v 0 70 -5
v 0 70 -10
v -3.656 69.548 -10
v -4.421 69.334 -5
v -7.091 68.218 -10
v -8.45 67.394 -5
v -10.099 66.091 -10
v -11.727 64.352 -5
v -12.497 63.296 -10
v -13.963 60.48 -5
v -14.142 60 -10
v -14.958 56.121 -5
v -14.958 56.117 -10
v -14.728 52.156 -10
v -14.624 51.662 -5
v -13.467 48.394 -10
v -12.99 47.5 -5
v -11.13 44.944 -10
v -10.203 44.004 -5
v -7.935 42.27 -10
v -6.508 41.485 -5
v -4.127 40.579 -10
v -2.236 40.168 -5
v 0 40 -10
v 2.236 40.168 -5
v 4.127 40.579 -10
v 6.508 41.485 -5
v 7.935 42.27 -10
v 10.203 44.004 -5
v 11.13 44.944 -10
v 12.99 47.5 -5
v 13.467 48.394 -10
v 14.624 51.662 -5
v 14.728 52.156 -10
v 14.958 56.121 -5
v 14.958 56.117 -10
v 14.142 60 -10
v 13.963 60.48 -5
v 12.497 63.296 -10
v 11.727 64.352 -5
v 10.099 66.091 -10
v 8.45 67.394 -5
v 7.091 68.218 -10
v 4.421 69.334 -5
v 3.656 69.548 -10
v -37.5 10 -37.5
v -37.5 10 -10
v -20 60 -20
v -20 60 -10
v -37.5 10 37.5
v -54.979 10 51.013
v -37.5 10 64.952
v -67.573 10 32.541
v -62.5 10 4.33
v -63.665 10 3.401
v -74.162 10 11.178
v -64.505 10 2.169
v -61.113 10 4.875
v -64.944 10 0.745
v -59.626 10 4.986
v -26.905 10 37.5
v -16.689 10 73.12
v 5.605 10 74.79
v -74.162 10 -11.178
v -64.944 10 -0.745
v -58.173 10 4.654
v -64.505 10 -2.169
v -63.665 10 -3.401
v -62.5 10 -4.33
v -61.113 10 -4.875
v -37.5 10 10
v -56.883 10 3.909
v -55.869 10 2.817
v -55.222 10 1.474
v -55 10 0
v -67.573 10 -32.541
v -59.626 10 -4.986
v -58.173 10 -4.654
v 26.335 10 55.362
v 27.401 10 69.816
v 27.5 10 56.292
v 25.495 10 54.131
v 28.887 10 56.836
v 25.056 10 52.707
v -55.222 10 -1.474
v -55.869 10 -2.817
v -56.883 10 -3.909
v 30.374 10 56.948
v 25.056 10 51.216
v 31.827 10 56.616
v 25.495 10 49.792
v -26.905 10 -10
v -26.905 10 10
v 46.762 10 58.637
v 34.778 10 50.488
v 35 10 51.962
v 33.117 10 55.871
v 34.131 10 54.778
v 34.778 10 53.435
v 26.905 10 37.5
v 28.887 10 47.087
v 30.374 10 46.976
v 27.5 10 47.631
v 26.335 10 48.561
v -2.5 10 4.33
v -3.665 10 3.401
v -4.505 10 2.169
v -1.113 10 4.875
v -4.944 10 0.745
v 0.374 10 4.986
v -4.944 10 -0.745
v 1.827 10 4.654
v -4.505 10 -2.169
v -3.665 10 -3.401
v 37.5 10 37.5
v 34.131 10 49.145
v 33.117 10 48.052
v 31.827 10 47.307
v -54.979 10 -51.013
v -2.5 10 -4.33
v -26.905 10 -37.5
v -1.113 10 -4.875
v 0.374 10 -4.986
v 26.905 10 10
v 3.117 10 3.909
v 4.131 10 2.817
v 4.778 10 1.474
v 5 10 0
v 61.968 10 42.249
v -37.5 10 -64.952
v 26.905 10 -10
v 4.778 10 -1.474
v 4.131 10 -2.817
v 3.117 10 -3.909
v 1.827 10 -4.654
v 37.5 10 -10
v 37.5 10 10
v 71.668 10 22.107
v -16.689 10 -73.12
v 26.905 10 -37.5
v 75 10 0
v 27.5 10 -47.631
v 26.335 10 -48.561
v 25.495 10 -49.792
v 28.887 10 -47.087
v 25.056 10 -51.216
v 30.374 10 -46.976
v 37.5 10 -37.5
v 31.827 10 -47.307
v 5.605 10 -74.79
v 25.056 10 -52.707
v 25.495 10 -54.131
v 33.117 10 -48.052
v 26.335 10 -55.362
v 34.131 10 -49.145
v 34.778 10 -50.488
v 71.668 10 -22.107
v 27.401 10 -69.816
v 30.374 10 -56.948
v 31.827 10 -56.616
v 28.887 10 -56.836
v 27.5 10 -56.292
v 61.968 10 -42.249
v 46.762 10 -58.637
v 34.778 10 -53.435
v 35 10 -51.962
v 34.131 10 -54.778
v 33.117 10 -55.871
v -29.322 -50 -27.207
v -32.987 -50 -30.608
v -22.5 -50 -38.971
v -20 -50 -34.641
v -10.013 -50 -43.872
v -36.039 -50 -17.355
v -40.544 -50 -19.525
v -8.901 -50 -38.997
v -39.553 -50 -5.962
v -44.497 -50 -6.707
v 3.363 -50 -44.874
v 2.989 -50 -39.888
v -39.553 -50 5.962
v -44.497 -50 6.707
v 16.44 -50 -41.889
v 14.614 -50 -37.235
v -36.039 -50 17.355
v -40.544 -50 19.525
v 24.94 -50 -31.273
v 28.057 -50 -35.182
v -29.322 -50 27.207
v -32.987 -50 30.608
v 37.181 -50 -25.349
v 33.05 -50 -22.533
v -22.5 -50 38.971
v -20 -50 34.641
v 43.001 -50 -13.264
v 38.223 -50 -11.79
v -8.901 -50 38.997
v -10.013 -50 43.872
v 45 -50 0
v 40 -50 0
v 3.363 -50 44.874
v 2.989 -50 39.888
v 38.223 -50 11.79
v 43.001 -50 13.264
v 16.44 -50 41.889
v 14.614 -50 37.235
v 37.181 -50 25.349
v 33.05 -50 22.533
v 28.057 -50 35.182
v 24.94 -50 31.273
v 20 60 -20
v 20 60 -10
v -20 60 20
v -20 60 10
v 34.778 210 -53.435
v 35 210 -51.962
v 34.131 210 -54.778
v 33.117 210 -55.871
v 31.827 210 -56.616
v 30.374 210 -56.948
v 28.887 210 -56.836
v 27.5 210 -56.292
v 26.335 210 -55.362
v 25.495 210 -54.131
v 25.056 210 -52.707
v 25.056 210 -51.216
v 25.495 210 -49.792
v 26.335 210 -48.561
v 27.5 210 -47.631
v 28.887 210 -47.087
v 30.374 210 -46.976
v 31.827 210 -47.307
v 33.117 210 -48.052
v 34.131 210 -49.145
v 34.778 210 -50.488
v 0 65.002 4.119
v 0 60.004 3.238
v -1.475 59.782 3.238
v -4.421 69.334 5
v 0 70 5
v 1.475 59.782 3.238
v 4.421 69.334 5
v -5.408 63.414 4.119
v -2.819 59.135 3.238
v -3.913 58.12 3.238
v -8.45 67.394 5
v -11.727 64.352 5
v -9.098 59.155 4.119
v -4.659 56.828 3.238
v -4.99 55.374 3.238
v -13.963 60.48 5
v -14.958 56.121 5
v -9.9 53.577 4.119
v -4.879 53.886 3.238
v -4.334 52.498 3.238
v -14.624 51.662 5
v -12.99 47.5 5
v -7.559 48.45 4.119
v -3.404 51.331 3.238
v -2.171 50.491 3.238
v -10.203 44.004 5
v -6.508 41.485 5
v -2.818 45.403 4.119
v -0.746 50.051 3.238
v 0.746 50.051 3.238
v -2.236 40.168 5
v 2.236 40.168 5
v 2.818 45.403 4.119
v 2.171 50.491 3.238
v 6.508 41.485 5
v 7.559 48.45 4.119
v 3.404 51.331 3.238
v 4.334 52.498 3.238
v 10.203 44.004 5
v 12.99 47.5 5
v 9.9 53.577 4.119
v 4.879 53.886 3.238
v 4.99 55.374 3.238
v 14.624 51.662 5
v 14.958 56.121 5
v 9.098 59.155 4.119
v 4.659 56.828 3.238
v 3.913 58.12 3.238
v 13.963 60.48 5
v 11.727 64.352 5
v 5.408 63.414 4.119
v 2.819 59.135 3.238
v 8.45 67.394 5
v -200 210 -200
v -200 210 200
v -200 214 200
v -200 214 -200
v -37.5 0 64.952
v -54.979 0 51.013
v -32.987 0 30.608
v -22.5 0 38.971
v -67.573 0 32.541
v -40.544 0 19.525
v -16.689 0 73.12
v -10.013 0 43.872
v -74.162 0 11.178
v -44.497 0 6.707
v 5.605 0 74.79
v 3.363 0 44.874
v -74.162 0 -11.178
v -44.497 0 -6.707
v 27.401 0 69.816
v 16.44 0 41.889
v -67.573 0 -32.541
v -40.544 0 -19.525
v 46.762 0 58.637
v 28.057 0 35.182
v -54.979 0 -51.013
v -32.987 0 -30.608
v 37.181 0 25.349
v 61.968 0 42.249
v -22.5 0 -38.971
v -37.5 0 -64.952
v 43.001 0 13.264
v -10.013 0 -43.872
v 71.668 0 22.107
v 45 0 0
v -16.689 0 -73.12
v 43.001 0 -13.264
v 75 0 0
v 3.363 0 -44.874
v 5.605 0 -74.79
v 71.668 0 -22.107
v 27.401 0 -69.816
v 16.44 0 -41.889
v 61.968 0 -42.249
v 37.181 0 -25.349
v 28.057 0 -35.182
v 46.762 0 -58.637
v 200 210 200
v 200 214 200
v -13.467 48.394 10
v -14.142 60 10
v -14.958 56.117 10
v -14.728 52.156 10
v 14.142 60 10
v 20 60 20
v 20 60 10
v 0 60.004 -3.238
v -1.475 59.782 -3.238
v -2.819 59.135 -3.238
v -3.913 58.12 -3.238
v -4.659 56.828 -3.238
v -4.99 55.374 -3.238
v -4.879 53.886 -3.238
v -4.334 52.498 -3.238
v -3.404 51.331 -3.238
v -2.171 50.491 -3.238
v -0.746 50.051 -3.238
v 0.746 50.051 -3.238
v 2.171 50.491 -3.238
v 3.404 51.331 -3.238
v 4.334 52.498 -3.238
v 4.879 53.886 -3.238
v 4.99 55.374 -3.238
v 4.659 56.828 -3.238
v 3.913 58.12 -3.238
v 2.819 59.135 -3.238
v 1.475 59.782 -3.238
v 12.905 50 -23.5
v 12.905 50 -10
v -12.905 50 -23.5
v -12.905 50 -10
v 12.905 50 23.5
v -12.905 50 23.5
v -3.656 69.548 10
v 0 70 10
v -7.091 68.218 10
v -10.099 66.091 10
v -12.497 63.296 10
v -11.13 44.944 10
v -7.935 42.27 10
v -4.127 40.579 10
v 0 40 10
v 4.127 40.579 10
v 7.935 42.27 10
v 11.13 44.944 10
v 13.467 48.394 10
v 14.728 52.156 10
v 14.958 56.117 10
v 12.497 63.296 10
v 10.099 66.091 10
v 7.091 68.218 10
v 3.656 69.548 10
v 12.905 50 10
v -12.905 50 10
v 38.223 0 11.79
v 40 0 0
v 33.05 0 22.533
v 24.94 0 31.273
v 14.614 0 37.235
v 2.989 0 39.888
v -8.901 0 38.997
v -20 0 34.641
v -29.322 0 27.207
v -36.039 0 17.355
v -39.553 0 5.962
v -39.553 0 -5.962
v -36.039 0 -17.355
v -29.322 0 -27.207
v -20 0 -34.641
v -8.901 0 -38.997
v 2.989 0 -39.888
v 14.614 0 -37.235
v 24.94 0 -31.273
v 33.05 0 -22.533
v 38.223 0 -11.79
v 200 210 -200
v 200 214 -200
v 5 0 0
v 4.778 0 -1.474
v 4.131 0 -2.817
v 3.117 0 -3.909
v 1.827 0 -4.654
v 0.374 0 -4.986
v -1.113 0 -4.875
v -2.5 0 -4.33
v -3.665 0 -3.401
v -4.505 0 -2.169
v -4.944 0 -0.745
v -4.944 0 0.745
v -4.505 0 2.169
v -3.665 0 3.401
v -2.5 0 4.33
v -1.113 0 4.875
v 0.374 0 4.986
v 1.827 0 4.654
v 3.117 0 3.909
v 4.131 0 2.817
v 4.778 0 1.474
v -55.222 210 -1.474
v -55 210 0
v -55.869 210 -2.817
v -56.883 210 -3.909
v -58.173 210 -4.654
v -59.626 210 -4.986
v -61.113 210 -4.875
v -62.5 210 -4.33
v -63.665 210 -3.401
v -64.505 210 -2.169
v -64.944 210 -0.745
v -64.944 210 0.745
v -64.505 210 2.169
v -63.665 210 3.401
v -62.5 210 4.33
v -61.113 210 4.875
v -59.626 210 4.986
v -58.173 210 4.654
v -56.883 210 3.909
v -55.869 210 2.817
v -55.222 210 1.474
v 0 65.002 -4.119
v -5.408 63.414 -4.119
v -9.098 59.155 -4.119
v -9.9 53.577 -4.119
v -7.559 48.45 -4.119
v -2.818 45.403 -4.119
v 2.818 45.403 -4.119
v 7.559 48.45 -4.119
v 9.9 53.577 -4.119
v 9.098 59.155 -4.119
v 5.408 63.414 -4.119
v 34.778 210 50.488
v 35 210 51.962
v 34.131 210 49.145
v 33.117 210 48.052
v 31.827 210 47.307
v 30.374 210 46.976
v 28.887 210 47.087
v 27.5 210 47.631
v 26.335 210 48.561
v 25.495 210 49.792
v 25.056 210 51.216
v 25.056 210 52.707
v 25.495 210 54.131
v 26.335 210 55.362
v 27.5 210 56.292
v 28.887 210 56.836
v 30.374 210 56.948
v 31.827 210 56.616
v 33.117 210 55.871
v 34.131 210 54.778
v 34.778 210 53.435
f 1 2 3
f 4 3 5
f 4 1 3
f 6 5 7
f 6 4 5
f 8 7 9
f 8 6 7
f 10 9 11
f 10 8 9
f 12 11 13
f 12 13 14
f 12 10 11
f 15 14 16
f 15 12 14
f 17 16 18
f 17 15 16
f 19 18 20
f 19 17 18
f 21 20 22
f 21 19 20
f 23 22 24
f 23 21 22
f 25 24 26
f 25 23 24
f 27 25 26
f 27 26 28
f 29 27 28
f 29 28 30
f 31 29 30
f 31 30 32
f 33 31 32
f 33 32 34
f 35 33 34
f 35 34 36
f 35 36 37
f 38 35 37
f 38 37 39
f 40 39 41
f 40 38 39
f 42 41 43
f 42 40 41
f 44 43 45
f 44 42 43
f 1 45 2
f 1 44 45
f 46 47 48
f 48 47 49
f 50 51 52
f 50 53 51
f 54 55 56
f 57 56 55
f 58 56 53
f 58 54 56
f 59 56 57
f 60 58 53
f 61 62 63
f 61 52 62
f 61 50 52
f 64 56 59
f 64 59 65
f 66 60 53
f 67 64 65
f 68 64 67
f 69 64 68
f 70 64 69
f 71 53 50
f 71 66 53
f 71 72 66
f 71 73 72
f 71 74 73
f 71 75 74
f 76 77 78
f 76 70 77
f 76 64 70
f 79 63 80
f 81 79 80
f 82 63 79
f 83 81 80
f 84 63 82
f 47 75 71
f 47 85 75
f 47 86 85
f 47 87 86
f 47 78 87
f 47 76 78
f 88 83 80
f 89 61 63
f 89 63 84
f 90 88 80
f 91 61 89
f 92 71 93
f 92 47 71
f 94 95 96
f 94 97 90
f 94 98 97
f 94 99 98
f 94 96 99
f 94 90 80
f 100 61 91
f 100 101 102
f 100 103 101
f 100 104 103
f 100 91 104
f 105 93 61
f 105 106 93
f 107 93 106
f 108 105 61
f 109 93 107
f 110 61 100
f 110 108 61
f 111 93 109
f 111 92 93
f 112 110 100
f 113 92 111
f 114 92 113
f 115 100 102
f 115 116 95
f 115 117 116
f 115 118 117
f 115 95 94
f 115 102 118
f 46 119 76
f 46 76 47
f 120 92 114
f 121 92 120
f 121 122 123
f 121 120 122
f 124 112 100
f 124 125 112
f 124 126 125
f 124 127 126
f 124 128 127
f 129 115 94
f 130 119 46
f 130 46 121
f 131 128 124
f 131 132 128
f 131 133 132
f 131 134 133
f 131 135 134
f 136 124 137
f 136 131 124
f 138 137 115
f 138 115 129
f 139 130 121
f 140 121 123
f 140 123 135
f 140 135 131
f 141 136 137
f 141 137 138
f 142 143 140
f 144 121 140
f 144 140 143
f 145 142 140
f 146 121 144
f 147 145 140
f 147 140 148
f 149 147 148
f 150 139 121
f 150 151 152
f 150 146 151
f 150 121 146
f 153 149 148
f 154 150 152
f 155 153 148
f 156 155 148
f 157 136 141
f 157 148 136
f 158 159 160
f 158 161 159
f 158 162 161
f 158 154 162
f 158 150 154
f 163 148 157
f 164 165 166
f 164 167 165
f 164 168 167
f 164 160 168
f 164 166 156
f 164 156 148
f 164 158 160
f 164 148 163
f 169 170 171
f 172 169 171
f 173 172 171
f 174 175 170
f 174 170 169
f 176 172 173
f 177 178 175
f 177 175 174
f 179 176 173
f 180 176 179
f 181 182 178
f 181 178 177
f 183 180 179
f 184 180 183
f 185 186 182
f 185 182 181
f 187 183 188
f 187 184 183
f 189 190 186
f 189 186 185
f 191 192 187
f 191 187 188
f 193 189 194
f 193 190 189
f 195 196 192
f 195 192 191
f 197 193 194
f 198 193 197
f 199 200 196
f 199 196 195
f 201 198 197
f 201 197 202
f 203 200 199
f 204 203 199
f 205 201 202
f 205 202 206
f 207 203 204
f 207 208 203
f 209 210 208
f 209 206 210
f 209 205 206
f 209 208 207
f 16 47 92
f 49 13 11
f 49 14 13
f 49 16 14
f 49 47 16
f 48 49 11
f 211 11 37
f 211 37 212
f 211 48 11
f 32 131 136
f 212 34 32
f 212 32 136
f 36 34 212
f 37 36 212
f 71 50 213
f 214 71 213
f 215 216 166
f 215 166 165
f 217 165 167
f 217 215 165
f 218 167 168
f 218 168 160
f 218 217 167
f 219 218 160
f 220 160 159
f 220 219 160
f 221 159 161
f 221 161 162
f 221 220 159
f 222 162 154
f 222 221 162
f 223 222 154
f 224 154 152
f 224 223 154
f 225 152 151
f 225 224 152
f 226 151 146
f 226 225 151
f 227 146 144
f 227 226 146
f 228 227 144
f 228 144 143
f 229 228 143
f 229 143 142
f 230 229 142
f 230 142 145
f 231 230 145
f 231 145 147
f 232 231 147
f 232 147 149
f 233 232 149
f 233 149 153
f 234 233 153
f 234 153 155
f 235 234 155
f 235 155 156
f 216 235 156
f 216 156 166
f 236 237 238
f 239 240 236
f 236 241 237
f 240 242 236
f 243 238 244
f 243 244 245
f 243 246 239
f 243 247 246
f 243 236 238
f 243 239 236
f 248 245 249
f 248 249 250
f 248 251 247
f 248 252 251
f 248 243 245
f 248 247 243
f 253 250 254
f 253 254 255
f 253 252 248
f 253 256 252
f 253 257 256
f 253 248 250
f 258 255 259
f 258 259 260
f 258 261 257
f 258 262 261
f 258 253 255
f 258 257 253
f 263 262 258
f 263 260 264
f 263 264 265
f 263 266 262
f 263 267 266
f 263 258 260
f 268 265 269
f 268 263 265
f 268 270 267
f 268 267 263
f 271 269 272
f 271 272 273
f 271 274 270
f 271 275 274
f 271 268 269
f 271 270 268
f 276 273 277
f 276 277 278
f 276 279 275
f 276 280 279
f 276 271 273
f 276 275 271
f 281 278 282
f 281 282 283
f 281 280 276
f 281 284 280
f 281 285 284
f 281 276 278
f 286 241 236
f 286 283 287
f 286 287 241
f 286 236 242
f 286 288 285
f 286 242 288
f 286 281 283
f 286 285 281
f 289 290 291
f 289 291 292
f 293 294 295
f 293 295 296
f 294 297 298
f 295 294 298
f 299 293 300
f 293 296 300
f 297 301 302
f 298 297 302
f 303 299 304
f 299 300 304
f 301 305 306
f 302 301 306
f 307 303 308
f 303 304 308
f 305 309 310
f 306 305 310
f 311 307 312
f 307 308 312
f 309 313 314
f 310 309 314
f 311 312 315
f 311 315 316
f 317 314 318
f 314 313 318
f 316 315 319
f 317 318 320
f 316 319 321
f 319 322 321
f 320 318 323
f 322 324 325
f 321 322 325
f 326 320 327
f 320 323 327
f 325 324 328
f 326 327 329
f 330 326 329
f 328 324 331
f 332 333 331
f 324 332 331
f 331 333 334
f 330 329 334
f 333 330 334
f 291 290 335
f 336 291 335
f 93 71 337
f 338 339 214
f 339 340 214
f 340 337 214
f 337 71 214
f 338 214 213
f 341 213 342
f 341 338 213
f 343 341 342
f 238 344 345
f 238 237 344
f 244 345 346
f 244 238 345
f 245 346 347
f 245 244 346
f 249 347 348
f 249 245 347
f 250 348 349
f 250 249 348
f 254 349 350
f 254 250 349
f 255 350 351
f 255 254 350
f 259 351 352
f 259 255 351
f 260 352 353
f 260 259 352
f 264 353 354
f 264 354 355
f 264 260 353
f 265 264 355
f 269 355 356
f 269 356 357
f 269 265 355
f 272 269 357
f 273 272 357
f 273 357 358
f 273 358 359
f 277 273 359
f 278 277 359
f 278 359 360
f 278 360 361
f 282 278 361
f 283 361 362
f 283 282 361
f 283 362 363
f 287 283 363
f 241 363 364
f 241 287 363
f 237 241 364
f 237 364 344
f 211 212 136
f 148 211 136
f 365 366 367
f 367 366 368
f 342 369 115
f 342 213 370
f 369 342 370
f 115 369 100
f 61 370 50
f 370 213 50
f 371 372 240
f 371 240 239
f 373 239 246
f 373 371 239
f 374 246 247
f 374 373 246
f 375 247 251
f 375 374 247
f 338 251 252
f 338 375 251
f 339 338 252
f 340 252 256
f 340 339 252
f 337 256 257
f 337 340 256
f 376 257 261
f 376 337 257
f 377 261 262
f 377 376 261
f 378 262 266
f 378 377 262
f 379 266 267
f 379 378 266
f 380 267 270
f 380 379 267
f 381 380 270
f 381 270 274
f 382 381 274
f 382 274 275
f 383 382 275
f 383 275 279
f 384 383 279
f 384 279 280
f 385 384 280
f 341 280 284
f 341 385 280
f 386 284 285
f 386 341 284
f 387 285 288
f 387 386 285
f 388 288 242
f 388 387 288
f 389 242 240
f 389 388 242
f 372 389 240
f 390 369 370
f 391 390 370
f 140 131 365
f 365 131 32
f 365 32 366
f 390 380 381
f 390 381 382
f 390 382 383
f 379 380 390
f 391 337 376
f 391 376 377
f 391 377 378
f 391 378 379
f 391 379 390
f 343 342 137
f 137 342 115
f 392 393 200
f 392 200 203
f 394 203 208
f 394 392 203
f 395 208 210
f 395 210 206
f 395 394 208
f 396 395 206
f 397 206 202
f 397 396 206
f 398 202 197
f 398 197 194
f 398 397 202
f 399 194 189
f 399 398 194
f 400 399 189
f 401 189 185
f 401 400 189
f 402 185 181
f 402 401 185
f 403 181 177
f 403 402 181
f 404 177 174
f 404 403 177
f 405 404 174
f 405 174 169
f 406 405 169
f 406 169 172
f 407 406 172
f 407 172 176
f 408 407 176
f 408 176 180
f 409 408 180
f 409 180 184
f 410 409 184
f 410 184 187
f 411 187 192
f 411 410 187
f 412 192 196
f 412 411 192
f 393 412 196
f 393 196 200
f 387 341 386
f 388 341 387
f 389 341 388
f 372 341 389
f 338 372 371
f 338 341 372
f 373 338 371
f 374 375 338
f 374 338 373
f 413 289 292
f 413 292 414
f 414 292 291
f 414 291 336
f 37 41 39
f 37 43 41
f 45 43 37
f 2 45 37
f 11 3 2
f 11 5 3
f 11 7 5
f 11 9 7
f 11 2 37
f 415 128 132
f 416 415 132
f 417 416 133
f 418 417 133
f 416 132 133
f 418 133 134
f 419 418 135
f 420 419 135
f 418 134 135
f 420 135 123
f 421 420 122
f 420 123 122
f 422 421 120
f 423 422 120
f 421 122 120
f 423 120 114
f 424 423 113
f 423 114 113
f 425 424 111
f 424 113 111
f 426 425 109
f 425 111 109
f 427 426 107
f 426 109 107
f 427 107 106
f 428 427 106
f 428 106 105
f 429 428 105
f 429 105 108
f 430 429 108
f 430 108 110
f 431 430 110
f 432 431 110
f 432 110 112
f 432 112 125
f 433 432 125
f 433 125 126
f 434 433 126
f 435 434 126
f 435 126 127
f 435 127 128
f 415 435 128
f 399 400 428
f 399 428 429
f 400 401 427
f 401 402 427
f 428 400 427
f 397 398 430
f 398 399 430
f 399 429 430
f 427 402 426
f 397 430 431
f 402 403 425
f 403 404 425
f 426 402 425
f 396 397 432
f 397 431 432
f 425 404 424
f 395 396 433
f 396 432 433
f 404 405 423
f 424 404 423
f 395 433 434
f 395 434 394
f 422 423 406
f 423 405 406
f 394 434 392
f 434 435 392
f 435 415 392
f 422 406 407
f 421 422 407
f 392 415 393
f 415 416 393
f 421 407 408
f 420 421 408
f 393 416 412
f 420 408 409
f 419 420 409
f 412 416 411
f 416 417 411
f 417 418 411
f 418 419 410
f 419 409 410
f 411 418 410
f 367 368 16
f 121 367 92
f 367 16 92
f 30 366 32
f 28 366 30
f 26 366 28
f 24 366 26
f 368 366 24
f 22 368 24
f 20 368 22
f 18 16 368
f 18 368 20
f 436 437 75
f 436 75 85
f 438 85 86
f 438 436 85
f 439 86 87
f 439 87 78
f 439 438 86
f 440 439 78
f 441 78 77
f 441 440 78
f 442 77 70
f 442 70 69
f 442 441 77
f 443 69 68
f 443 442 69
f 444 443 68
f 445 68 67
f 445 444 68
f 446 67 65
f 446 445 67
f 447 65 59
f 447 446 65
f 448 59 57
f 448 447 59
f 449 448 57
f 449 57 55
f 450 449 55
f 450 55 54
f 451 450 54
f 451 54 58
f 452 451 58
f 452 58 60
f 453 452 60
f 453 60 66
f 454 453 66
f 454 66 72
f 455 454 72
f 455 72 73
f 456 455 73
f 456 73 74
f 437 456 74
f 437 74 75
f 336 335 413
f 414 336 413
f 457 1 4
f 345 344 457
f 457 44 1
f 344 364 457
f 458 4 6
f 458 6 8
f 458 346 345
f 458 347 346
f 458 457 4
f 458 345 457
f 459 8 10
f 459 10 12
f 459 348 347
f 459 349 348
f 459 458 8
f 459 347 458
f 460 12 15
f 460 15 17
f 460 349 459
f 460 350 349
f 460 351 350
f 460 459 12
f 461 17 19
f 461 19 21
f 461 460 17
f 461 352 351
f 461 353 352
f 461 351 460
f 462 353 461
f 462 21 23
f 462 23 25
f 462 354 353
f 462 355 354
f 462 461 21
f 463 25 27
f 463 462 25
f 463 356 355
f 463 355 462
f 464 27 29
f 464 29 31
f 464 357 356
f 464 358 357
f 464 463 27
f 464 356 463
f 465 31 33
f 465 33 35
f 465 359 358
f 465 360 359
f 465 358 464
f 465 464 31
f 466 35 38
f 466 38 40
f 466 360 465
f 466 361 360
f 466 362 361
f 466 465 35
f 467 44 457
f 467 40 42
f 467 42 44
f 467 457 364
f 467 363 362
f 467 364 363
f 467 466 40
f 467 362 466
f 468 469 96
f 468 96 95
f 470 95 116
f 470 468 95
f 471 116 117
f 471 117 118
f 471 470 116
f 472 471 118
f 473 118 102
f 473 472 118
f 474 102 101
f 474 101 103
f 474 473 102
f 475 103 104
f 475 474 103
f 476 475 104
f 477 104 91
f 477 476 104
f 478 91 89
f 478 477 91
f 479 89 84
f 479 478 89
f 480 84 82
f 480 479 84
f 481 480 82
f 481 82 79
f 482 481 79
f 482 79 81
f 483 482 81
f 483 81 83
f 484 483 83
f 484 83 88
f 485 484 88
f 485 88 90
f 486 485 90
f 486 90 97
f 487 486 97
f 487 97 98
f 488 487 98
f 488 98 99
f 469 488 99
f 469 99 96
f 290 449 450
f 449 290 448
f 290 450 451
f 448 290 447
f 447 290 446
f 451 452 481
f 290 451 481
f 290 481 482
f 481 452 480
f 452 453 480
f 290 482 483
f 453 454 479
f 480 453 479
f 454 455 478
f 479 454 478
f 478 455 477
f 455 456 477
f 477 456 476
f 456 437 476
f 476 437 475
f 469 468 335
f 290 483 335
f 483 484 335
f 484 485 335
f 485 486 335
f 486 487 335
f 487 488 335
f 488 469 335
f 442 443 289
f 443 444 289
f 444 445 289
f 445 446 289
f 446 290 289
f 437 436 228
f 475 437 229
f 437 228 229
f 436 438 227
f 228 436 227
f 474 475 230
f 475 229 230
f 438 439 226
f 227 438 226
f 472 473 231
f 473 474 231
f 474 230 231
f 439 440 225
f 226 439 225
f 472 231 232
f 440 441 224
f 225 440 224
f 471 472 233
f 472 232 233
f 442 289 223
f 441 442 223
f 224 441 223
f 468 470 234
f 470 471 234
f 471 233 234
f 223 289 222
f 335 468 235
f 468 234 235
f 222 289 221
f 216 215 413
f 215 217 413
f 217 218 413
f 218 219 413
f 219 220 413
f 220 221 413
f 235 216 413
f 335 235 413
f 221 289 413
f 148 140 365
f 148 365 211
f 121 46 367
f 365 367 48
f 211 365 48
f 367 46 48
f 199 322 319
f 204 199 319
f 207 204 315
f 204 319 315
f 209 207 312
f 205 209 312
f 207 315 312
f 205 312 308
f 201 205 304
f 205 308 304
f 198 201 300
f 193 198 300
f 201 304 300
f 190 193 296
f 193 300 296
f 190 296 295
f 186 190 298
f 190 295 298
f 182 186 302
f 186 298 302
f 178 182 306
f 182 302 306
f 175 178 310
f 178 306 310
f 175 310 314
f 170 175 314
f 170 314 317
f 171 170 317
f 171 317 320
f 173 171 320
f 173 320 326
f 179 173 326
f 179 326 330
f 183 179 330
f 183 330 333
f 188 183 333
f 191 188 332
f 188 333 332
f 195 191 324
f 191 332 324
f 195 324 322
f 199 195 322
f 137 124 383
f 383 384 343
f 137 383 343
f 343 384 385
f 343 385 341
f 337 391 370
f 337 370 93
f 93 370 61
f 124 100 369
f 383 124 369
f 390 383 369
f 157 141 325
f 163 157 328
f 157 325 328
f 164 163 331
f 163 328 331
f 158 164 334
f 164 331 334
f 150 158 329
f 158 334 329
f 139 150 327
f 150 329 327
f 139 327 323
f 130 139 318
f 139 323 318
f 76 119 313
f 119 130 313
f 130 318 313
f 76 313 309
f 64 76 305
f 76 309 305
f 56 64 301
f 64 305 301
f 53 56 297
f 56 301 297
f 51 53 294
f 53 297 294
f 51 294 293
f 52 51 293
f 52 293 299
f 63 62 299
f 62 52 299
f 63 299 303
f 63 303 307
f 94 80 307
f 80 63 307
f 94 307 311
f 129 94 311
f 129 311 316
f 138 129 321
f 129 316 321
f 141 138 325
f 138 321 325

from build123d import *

# Parameters (mm, degrees)
SKETCH1_R               = 75
BOSS_EXTRUDE1_DEPTH     = 10
SKETCH2_R               = 45
SKETCH2_R_2             = 40
BOSS_EXTRUDE2_DEPTH     = 50
SKETCH5_W               = 75
SKETCH5_H               = 75
BOSS_EXTRUDE3_DEPTH     = 50
CUT_EXTRUDE2_DEPTH      = 103
CUT_EXTRUDE3_DEPTH      = 103
CUT_EXTRUDE3_DEPTH_BACK = 103
CUT_EXTRUDE4_DEPTH      = 103
CUT_EXTRUDE4_DEPTH_BACK = 103
SKETCH9_W               = 20
SKETCH9_H               = 50
SKETCH10_R              = 5
CUT_EXTRUDE5_DEPTH      = 103
SKETCH11_R              = 5
SKETCH13_W              = 400
SKETCH13_H              = 400
BOSS_EXTRUDE4_DEPTH     = 4


with BuildPart() as part:
    # Sketch1 → Boss-Extrude1 (new body)
    with BuildSketch(Plane(origin=(0, 0, 0), x_dir=(1, 0, 0), z_dir=(0, 1, 0))):
        Circle(SKETCH1_R)
    extrude(amount=BOSS_EXTRUDE1_DEPTH)

    # Sketch2 → Boss-Extrude2 (add)
    with BuildSketch(Plane.XZ):
        Circle(SKETCH2_R)
        Circle(SKETCH2_R_2, mode=Mode.SUBTRACT)
    extrude(amount=BOSS_EXTRUDE2_DEPTH)

    # Sketch5 → Boss-Extrude3 (add)
    with BuildSketch(Plane(origin=(0, 10, 0), x_dir=(1, 0, 0), z_dir=(0, 1, 0))):
        Rectangle(SKETCH5_W, SKETCH5_H)
    extrude(amount=BOSS_EXTRUDE3_DEPTH)

    # Sketch6 → Cut-Extrude2 (cut)
    with BuildSketch(Plane.XY.offset(37.5)):
        Polygon((20, 60), (37.5, 10), (43.069722315, 10), (43.069722315, 63.034625831), (-42.678571429, 63.034625831), (-42.678571429, 10), (-37.5, 10), (-20, 60), align=None)
        Polygon((-12.90518995, 50), (-26.90518995, 10), (26.90518995, 10), (12.90518995, 50), align=None)
    extrude(amount=-CUT_EXTRUDE2_DEPTH, mode=Mode.SUBTRACT)

    # Sketch7 → Cut-Extrude3 (cut, two sides: drawn at the far end of the back side and taken through both)
    with BuildSketch(Plane(origin=(0, 0, 0), x_dir=(0, 0, -1), z_dir=(1, 0, 0)).offset(-CUT_EXTRUDE3_DEPTH_BACK)):
        Polygon((20, 60), (-20, 60), (-37.5, 10), (-47.69302584, 10), (-47.69302584, 63.764621125), (47.449694076, 63.764621125), (47.449694076, 10), (37.5, 10), align=None)
    extrude(amount=CUT_EXTRUDE3_DEPTH + CUT_EXTRUDE3_DEPTH_BACK, mode=Mode.SUBTRACT)

    # Sketch9 → Cut-Extrude4 (cut, two sides: drawn at the far end of the back side and taken through both)
    with BuildSketch(Plane(origin=(0, 0, 0), x_dir=(0, 0, -1), z_dir=(1, 0, 0)).offset(-CUT_EXTRUDE4_DEPTH_BACK)):
        with Locations((0, 35)):
            Rectangle(SKETCH9_W, SKETCH9_H)
    extrude(amount=CUT_EXTRUDE4_DEPTH + CUT_EXTRUDE4_DEPTH_BACK, mode=Mode.SUBTRACT)

    # Sketch10 → Cut-Extrude5 (cut)
    with BuildSketch(Plane(origin=(0, 10, 0), x_dir=(1, 0, 0), z_dir=(0, 1, 0))):
        Circle(SKETCH10_R)
    extrude(amount=-CUT_EXTRUDE5_DEPTH, mode=Mode.SUBTRACT)

    # Sweep1: sweep along a curve in space
    with BuildLine() as sweep1_path:
        Line((-60, 10, 0), (-60, 210, 0))
    # Sketch11 → Sweep1 (sweep)
    with BuildSketch(Plane(origin=(0, 10, 0), x_dir=(1, 0, 0), z_dir=(0, 1, 0))):
        with Locations((-60, 0)):
            Circle(SKETCH11_R)
        with Locations((30, 51.961524227)):
            Circle(SKETCH11_R)
        with Locations((30, -51.961524227)):
            Circle(SKETCH11_R)
    sweep(path=sweep1_path.line)

    # Sketch13 → Boss-Extrude4 (add)
    with BuildSketch(Plane(origin=(0, 210, 0), x_dir=(1, 0, 0), z_dir=(0, 1, 0))):
        Rectangle(SKETCH13_W, SKETCH13_H)
    extrude(amount=BOSS_EXTRUDE4_DEPTH)

    # Sketch17 → Revolve2 (revolve)
    with BuildSketch(Plane(origin=(0, 0, 0), x_dir=(0, 0, -1), z_dir=(1, 0, 0))):
        Polygon((10, 55), (10, 70), (5, 70), (3.237517532, 60.004465223), (-3.237517532, 60.004465223), (-5, 70), (-10, 70), (-10, 55), align=None)
    revolve(axis=Axis((0, 55, -10), (0, 0, 1)))


solid = part.part
